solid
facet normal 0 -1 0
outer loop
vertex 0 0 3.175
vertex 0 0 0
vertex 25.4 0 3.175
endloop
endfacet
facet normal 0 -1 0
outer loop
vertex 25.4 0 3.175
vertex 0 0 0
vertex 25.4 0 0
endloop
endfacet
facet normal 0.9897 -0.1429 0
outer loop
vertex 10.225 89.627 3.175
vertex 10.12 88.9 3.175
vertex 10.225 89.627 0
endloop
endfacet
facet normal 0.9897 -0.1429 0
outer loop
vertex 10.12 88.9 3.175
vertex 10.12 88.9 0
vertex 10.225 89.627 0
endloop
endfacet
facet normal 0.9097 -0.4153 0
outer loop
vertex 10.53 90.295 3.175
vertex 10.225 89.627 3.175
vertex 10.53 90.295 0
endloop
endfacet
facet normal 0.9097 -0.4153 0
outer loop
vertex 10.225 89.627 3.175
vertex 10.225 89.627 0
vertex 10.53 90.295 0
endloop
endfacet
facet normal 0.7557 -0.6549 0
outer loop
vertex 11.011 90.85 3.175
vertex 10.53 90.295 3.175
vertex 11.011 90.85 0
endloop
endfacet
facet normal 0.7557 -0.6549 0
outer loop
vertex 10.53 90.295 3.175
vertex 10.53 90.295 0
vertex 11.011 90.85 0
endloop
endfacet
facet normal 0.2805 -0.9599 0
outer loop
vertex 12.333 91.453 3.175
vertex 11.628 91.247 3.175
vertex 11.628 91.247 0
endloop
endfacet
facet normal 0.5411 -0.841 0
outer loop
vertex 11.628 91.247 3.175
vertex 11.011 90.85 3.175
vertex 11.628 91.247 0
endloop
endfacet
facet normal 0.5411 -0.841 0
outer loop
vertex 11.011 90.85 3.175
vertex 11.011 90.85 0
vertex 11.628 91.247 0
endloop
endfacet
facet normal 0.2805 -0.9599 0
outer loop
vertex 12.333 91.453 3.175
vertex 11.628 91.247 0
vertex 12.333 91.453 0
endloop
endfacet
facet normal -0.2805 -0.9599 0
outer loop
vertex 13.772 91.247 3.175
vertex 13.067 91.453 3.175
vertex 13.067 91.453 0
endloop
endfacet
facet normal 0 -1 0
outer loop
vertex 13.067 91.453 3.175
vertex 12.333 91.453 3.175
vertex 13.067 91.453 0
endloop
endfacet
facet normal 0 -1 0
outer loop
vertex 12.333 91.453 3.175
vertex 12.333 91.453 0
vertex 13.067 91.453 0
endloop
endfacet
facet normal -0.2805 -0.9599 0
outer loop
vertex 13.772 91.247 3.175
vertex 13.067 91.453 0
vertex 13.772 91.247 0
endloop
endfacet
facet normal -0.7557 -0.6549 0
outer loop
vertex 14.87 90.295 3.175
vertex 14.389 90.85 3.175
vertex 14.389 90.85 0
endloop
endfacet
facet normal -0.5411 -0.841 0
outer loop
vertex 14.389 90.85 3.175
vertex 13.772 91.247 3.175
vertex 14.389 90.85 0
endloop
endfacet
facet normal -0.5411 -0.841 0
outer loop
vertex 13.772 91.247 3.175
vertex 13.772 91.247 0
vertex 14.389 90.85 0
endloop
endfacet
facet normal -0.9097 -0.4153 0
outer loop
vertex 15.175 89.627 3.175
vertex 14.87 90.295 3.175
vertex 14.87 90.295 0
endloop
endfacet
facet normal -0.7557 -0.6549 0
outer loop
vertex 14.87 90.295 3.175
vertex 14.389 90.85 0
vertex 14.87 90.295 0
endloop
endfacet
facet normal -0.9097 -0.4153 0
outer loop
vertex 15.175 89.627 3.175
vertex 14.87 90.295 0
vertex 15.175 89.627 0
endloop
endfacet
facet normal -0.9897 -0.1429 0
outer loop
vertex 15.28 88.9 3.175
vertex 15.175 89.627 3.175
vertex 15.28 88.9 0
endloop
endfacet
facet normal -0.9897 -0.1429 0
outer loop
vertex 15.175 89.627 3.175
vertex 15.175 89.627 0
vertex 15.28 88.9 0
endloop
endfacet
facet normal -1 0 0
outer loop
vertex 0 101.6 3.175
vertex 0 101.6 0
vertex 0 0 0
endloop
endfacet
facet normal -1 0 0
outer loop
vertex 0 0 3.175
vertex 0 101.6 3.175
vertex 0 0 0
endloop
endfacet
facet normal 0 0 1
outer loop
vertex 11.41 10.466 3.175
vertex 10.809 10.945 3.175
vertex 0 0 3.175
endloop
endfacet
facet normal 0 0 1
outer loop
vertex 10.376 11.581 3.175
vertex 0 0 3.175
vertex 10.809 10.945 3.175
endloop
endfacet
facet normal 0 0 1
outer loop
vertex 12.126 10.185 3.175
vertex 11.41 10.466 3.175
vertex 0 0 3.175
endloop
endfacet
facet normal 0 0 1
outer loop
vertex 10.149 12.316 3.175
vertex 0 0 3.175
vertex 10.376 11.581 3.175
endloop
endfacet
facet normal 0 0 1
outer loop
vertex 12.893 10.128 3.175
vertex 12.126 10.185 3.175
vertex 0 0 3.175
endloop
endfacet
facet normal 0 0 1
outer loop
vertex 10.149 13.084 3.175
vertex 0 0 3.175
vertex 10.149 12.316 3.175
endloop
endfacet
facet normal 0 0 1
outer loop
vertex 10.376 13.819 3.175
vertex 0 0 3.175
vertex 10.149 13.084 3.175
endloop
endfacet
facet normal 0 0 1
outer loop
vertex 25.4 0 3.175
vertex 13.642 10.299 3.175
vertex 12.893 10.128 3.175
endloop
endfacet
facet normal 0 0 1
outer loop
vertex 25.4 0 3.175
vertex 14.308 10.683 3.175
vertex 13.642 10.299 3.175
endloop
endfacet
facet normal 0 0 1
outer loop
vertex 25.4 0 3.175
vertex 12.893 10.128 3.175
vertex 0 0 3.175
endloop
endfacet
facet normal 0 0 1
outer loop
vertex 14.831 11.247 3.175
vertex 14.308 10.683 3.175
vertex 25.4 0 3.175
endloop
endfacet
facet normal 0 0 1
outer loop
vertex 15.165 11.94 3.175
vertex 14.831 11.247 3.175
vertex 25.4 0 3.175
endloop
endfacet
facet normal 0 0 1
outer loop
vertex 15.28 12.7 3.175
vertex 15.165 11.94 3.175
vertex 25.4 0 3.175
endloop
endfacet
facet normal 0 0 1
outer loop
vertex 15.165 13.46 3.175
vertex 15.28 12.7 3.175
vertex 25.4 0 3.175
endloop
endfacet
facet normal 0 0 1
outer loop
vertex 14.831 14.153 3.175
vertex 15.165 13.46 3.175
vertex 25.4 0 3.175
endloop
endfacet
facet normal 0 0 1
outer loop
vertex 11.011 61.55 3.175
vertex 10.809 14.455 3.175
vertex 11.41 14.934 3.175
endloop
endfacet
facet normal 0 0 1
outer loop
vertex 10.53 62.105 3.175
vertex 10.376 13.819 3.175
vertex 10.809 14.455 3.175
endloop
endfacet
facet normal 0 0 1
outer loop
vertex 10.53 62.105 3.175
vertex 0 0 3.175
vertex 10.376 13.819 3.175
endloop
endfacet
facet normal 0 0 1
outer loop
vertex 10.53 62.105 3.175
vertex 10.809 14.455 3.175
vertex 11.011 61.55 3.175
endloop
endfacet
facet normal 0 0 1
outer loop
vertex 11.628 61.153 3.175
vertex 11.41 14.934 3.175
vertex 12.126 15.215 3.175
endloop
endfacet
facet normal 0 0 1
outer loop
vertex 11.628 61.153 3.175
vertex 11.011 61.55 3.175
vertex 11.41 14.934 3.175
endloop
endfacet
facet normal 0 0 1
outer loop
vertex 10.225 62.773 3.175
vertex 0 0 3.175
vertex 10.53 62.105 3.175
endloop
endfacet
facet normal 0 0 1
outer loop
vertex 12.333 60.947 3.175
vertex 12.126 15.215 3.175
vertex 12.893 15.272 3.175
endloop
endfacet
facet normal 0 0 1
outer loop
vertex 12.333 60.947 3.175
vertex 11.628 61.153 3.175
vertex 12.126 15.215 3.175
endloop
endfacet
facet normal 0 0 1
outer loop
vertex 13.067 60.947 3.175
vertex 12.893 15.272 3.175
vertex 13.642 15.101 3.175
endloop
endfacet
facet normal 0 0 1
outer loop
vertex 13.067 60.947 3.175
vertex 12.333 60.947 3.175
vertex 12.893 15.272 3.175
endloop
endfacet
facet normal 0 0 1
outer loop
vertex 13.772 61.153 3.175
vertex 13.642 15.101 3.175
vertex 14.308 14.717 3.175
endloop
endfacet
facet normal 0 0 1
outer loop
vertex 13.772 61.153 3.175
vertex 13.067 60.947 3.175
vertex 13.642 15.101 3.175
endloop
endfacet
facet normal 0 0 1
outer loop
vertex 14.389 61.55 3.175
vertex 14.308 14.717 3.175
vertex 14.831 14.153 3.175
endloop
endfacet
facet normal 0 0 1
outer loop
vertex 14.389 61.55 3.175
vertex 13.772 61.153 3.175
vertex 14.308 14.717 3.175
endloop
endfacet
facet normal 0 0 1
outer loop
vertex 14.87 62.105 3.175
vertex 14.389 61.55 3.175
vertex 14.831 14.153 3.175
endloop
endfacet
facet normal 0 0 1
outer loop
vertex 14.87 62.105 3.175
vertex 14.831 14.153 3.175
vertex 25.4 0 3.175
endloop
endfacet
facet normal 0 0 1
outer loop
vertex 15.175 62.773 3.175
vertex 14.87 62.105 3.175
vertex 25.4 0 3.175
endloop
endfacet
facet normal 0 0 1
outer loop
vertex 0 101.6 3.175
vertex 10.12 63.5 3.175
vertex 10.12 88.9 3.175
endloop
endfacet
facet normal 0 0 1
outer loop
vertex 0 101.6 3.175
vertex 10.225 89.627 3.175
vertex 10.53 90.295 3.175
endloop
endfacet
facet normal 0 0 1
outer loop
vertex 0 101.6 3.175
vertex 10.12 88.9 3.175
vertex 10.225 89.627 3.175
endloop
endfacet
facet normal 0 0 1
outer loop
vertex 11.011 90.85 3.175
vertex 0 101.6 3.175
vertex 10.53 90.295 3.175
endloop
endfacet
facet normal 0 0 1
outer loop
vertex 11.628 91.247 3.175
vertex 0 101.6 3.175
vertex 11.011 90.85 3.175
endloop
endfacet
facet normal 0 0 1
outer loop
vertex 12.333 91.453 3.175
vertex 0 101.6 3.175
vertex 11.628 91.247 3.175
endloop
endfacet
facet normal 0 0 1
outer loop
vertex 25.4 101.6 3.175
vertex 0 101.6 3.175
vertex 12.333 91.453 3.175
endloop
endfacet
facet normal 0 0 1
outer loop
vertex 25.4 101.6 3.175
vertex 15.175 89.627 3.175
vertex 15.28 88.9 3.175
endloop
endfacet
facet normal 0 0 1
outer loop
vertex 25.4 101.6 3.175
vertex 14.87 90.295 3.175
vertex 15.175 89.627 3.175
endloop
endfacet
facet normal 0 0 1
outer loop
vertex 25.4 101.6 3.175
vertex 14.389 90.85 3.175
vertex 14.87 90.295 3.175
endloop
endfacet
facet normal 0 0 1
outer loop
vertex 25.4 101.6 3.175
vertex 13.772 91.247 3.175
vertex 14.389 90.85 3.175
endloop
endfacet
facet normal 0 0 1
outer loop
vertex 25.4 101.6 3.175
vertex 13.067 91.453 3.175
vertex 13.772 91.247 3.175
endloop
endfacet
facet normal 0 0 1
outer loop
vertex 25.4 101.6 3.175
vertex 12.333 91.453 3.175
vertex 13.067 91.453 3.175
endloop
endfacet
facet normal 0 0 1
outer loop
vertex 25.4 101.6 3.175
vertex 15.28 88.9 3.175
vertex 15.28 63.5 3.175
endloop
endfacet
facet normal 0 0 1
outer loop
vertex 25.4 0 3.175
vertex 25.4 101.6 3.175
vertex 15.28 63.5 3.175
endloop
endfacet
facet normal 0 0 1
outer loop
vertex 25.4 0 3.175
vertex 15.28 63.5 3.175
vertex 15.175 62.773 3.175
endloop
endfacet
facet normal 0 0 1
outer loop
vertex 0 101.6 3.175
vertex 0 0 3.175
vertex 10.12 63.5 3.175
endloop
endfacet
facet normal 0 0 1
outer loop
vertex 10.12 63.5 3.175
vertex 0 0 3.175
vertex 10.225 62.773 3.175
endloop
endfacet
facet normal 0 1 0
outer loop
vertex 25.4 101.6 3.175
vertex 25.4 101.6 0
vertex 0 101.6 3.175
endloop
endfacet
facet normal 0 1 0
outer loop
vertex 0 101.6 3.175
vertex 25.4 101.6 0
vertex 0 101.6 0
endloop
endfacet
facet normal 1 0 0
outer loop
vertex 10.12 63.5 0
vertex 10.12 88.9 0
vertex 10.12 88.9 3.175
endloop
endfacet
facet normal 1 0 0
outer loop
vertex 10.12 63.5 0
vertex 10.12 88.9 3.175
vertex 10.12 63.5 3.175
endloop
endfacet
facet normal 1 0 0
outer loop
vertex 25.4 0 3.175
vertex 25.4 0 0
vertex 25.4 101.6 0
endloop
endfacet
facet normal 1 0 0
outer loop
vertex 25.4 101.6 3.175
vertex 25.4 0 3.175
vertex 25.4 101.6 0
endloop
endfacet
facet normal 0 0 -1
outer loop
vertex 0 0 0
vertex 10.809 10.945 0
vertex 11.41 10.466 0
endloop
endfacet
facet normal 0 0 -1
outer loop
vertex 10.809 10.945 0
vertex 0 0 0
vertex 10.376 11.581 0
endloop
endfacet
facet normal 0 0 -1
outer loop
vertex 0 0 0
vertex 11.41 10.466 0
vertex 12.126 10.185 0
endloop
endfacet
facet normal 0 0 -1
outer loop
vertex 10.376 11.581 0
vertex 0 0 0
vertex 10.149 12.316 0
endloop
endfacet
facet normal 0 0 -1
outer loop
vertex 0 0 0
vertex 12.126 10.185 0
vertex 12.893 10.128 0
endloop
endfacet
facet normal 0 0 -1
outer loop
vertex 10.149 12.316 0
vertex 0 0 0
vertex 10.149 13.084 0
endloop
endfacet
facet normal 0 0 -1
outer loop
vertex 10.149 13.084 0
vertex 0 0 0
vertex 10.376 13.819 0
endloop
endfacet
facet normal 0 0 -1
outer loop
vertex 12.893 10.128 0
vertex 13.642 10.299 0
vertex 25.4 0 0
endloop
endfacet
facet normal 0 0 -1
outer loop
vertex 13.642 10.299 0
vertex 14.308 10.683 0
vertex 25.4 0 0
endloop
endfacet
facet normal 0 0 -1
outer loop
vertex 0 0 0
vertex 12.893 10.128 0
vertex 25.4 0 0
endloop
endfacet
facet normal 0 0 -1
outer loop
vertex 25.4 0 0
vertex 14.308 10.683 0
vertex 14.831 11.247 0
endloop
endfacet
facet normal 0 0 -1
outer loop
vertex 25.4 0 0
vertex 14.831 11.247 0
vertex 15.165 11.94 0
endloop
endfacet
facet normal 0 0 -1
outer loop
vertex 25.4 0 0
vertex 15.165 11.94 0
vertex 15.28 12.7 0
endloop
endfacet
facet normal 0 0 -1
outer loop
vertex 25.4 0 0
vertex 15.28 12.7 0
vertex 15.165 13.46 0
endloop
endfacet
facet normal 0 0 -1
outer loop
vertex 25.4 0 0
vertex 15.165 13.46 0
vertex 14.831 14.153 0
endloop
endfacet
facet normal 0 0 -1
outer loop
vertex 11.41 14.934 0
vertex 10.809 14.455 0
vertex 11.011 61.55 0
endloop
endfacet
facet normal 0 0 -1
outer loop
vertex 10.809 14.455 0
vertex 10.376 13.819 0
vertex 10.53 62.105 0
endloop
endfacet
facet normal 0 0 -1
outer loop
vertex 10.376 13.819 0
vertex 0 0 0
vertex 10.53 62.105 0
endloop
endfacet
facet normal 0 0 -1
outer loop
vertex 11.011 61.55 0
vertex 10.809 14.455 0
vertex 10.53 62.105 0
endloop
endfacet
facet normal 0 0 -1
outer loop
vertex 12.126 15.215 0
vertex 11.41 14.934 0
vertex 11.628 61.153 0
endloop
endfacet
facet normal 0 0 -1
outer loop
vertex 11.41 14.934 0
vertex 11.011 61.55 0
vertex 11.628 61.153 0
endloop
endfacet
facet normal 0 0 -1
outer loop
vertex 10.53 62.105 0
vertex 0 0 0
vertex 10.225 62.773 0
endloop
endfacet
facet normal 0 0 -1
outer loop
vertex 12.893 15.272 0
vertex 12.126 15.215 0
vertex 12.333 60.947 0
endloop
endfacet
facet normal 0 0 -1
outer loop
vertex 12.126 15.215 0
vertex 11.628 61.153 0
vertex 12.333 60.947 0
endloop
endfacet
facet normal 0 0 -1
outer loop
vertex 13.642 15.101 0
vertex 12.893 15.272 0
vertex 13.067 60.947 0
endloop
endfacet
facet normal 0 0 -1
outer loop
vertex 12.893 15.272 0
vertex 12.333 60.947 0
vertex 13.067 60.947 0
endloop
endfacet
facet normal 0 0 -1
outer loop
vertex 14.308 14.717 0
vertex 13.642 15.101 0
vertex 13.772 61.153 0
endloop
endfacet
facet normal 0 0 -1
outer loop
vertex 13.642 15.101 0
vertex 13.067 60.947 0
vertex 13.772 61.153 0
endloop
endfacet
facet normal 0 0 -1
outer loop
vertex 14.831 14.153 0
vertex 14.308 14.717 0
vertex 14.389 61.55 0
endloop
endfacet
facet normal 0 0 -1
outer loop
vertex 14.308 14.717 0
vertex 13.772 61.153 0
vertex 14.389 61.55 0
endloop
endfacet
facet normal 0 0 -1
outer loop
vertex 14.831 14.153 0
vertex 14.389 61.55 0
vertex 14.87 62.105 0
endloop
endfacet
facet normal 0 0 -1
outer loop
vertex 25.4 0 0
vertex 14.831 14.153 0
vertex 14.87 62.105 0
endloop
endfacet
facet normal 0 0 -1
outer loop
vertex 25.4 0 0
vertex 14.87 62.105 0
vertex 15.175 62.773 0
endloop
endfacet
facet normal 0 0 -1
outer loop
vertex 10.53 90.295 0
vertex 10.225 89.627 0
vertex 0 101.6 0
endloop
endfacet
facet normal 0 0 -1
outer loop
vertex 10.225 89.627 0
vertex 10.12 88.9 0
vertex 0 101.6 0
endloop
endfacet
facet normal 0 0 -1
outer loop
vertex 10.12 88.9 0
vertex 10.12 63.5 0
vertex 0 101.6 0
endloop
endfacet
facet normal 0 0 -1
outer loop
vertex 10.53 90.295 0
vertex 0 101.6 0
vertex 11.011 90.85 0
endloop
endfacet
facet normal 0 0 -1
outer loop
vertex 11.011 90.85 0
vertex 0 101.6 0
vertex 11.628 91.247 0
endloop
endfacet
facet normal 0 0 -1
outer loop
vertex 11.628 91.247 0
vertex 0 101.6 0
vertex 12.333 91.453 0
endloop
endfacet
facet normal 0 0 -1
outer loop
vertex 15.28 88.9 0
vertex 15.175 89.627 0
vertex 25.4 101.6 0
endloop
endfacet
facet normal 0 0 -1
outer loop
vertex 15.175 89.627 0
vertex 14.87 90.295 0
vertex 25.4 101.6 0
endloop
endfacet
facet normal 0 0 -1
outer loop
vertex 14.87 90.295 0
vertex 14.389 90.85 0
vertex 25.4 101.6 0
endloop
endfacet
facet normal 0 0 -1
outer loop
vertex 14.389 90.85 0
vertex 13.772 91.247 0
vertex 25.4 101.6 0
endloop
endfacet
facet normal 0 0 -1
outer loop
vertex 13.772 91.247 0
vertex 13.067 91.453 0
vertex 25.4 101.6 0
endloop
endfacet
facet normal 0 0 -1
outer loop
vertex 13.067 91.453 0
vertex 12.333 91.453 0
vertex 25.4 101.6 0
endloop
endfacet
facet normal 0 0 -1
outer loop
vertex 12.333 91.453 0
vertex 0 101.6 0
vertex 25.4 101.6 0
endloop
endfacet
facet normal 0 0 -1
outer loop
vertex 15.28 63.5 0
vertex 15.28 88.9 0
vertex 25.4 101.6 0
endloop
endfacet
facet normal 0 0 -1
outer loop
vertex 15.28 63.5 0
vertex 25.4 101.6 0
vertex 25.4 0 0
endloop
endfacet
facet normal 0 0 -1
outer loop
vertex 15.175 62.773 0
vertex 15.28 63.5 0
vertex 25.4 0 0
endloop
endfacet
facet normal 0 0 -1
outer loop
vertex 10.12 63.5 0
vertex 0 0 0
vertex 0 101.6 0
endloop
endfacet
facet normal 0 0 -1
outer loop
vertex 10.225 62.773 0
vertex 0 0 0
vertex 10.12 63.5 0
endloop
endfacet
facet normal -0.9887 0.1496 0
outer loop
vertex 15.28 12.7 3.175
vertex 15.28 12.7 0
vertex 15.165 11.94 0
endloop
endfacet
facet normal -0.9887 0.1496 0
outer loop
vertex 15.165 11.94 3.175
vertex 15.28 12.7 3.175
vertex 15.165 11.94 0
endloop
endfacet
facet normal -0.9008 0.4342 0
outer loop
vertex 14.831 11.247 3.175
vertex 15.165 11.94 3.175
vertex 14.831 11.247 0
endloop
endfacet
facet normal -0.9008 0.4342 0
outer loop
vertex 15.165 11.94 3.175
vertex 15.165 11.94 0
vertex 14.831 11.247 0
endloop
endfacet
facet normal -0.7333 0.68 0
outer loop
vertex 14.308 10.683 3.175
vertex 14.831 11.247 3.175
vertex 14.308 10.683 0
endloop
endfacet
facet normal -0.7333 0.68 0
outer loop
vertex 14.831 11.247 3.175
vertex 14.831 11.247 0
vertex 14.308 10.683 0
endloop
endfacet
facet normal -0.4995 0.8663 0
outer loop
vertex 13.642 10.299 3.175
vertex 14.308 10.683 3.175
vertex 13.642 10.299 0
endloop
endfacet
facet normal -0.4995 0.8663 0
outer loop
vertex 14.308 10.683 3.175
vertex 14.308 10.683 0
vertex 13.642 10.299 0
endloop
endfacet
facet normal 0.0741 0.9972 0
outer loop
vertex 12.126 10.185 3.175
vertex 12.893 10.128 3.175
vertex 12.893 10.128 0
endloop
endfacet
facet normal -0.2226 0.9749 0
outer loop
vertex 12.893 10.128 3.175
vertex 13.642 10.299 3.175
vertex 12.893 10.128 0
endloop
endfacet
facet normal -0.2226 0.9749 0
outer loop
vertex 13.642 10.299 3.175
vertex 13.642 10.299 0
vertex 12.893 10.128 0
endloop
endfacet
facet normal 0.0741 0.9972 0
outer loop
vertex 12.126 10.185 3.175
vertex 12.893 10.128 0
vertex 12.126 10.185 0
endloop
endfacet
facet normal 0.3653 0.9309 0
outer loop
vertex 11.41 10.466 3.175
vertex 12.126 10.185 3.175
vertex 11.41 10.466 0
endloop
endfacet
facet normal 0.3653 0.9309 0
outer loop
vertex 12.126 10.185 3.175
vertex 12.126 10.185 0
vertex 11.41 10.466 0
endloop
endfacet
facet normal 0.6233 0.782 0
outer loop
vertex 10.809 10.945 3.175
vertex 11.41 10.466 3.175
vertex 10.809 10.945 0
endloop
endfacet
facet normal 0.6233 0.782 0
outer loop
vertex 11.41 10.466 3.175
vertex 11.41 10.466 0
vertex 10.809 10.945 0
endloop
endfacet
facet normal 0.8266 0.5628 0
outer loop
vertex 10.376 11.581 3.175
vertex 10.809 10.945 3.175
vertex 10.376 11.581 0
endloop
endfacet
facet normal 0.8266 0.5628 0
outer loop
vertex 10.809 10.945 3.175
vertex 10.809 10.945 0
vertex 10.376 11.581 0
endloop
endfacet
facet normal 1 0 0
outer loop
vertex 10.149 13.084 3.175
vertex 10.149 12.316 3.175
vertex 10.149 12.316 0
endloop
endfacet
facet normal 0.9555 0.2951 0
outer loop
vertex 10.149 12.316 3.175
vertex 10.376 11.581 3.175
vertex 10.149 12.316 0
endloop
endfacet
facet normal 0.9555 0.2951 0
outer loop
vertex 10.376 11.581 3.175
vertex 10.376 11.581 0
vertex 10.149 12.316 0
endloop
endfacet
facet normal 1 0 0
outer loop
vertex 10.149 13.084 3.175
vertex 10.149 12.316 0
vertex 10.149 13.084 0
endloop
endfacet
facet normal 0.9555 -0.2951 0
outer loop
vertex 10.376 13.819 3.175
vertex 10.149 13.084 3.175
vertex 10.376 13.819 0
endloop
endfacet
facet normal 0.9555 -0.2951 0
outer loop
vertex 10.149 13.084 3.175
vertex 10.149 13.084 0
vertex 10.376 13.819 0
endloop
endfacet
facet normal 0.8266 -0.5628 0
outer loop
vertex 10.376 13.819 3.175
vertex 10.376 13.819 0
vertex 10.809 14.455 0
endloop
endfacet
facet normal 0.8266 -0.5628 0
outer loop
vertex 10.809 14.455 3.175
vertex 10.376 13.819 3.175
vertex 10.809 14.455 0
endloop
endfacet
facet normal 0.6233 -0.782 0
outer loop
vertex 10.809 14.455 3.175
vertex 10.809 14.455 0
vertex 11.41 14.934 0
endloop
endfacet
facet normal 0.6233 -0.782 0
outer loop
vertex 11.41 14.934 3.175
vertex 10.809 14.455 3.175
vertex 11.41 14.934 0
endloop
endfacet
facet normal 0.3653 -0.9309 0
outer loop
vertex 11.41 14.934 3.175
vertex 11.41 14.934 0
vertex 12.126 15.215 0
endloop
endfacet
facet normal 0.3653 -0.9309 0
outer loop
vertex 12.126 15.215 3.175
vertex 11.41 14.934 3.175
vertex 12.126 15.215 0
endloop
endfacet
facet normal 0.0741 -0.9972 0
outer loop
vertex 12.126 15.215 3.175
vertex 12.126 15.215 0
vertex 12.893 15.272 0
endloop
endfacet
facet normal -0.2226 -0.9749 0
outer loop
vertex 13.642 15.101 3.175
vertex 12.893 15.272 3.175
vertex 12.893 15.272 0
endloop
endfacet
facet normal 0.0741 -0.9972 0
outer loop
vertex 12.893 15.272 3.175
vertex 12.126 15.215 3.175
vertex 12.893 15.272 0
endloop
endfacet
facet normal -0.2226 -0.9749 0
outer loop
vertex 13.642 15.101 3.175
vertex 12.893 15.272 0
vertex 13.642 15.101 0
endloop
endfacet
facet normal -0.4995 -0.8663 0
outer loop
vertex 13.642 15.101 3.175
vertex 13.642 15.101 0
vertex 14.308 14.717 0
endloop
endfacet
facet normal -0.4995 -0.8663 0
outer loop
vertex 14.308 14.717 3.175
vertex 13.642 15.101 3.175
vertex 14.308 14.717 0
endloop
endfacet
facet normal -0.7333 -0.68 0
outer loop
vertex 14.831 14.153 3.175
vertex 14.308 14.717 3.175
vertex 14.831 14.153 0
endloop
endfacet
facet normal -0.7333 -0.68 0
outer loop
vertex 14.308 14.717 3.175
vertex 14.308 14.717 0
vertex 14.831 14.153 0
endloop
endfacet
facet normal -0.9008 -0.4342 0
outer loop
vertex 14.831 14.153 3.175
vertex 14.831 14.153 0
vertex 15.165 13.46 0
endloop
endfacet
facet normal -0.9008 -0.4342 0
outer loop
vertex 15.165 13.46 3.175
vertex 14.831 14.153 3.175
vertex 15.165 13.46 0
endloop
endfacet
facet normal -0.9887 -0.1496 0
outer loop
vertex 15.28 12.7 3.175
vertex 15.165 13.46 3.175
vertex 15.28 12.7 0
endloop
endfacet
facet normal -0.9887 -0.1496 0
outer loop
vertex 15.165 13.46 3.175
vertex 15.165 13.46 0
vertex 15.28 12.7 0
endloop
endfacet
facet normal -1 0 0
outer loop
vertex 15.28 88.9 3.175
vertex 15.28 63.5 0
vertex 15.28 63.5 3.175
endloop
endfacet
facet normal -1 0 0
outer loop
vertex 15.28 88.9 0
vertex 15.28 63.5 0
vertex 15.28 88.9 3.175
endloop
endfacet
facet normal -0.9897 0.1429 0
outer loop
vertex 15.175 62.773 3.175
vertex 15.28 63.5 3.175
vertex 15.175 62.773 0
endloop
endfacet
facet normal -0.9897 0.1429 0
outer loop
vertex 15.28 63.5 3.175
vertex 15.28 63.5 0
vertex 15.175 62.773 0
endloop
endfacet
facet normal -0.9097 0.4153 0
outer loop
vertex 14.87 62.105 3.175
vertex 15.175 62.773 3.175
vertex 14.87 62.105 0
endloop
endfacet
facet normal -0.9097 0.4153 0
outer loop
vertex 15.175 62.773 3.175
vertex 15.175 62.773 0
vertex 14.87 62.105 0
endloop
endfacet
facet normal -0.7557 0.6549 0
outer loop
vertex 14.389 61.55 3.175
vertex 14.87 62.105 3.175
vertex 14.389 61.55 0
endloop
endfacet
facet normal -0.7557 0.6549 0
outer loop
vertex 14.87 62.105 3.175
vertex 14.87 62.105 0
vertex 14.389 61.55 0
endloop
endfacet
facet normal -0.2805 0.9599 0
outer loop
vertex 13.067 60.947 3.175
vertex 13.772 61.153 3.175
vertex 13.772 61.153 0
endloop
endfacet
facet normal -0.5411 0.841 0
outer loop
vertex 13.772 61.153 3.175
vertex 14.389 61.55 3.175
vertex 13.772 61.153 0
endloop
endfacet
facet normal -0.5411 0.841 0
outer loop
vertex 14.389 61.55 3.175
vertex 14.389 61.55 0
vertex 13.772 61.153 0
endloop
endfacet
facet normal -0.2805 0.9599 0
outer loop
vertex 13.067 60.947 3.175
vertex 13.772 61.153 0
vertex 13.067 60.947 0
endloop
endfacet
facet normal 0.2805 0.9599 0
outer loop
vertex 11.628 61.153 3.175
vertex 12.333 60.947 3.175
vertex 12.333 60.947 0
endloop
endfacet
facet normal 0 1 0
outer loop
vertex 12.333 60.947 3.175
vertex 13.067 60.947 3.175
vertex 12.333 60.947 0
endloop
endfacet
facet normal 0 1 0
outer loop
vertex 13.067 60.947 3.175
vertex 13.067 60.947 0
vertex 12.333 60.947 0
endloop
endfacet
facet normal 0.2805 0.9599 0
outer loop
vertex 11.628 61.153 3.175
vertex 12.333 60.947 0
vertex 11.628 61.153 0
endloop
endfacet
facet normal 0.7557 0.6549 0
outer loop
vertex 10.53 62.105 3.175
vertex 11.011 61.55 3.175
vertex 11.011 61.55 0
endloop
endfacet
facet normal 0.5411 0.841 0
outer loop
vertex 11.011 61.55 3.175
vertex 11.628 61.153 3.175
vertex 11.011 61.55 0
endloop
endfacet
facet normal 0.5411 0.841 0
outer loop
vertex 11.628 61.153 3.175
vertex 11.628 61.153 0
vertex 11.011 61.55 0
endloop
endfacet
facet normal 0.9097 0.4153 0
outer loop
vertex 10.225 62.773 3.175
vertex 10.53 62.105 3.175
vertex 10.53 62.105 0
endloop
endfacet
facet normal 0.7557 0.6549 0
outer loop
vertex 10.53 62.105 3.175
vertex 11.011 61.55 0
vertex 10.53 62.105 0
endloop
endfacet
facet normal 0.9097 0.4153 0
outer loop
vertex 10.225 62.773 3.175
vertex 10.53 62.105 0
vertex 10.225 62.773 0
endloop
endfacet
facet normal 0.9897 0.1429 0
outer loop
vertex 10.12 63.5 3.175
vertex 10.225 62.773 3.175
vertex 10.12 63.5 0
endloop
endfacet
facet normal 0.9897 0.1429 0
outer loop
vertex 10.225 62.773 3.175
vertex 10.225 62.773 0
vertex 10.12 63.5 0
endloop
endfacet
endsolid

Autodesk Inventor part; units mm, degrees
ref_plane "YZ Plane" through (0, 0, 0) normal (1, 0, 0) x (0, 1, 0)
ref_plane "XZ Plane" through (0, 0, 0) normal (0, 1, 0) x (-1, 0, 0)
ref_plane "XY Plane" through (0, 0, 0) normal (0, 0, 1) x (1, 0, 0)
sketch "Sketch1" plane through (0, 0, 0) normal (0, 0, 1) x (1, 0, 0)
  line L0 (0, 0) -> (25.4, 0)
  line L1 (25.4, 0) -> (25.4, 101.6)
  line L2 (25.4, 101.6) -> (0, 101.6)
  line L3 (0, 101.6) -> (0, 0)
  line L4 (12.7, 0) -> (12.7, 12.7) construction
  line L5 (12.7, 101.6) -> (12.7, 88.9) construction
  circle A0 centre (12.7, 12.7) radius 2.5797
  line L6 (12.7, 88.9) -> (12.7, 63.5) construction
  line L7 (10.1203, 88.9) -> (10.1203, 63.5)
  line L8 (15.2797, 63.5) -> (15.2797, 88.9)
  arc A1 (15.2797, 88.9) -> (10.1203, 88.9) centre (12.7, 88.9) ccw
  arc A2 (10.1203, 63.5) -> (15.2797, 63.5) centre (12.7, 63.5) ccw
  point P0 (12.7, 76.2)
  dimension "d0" = 25.4
  dimension "d1" = 101.6
  dimension "d2" = 12.7
  dimension "d3" = 12.7
  dimension "d7" = 25.4
extrude "Extrusion2" add sketch "Sketch1" along normal blind 3.175
properties part number "Slot Bumper attachment"
